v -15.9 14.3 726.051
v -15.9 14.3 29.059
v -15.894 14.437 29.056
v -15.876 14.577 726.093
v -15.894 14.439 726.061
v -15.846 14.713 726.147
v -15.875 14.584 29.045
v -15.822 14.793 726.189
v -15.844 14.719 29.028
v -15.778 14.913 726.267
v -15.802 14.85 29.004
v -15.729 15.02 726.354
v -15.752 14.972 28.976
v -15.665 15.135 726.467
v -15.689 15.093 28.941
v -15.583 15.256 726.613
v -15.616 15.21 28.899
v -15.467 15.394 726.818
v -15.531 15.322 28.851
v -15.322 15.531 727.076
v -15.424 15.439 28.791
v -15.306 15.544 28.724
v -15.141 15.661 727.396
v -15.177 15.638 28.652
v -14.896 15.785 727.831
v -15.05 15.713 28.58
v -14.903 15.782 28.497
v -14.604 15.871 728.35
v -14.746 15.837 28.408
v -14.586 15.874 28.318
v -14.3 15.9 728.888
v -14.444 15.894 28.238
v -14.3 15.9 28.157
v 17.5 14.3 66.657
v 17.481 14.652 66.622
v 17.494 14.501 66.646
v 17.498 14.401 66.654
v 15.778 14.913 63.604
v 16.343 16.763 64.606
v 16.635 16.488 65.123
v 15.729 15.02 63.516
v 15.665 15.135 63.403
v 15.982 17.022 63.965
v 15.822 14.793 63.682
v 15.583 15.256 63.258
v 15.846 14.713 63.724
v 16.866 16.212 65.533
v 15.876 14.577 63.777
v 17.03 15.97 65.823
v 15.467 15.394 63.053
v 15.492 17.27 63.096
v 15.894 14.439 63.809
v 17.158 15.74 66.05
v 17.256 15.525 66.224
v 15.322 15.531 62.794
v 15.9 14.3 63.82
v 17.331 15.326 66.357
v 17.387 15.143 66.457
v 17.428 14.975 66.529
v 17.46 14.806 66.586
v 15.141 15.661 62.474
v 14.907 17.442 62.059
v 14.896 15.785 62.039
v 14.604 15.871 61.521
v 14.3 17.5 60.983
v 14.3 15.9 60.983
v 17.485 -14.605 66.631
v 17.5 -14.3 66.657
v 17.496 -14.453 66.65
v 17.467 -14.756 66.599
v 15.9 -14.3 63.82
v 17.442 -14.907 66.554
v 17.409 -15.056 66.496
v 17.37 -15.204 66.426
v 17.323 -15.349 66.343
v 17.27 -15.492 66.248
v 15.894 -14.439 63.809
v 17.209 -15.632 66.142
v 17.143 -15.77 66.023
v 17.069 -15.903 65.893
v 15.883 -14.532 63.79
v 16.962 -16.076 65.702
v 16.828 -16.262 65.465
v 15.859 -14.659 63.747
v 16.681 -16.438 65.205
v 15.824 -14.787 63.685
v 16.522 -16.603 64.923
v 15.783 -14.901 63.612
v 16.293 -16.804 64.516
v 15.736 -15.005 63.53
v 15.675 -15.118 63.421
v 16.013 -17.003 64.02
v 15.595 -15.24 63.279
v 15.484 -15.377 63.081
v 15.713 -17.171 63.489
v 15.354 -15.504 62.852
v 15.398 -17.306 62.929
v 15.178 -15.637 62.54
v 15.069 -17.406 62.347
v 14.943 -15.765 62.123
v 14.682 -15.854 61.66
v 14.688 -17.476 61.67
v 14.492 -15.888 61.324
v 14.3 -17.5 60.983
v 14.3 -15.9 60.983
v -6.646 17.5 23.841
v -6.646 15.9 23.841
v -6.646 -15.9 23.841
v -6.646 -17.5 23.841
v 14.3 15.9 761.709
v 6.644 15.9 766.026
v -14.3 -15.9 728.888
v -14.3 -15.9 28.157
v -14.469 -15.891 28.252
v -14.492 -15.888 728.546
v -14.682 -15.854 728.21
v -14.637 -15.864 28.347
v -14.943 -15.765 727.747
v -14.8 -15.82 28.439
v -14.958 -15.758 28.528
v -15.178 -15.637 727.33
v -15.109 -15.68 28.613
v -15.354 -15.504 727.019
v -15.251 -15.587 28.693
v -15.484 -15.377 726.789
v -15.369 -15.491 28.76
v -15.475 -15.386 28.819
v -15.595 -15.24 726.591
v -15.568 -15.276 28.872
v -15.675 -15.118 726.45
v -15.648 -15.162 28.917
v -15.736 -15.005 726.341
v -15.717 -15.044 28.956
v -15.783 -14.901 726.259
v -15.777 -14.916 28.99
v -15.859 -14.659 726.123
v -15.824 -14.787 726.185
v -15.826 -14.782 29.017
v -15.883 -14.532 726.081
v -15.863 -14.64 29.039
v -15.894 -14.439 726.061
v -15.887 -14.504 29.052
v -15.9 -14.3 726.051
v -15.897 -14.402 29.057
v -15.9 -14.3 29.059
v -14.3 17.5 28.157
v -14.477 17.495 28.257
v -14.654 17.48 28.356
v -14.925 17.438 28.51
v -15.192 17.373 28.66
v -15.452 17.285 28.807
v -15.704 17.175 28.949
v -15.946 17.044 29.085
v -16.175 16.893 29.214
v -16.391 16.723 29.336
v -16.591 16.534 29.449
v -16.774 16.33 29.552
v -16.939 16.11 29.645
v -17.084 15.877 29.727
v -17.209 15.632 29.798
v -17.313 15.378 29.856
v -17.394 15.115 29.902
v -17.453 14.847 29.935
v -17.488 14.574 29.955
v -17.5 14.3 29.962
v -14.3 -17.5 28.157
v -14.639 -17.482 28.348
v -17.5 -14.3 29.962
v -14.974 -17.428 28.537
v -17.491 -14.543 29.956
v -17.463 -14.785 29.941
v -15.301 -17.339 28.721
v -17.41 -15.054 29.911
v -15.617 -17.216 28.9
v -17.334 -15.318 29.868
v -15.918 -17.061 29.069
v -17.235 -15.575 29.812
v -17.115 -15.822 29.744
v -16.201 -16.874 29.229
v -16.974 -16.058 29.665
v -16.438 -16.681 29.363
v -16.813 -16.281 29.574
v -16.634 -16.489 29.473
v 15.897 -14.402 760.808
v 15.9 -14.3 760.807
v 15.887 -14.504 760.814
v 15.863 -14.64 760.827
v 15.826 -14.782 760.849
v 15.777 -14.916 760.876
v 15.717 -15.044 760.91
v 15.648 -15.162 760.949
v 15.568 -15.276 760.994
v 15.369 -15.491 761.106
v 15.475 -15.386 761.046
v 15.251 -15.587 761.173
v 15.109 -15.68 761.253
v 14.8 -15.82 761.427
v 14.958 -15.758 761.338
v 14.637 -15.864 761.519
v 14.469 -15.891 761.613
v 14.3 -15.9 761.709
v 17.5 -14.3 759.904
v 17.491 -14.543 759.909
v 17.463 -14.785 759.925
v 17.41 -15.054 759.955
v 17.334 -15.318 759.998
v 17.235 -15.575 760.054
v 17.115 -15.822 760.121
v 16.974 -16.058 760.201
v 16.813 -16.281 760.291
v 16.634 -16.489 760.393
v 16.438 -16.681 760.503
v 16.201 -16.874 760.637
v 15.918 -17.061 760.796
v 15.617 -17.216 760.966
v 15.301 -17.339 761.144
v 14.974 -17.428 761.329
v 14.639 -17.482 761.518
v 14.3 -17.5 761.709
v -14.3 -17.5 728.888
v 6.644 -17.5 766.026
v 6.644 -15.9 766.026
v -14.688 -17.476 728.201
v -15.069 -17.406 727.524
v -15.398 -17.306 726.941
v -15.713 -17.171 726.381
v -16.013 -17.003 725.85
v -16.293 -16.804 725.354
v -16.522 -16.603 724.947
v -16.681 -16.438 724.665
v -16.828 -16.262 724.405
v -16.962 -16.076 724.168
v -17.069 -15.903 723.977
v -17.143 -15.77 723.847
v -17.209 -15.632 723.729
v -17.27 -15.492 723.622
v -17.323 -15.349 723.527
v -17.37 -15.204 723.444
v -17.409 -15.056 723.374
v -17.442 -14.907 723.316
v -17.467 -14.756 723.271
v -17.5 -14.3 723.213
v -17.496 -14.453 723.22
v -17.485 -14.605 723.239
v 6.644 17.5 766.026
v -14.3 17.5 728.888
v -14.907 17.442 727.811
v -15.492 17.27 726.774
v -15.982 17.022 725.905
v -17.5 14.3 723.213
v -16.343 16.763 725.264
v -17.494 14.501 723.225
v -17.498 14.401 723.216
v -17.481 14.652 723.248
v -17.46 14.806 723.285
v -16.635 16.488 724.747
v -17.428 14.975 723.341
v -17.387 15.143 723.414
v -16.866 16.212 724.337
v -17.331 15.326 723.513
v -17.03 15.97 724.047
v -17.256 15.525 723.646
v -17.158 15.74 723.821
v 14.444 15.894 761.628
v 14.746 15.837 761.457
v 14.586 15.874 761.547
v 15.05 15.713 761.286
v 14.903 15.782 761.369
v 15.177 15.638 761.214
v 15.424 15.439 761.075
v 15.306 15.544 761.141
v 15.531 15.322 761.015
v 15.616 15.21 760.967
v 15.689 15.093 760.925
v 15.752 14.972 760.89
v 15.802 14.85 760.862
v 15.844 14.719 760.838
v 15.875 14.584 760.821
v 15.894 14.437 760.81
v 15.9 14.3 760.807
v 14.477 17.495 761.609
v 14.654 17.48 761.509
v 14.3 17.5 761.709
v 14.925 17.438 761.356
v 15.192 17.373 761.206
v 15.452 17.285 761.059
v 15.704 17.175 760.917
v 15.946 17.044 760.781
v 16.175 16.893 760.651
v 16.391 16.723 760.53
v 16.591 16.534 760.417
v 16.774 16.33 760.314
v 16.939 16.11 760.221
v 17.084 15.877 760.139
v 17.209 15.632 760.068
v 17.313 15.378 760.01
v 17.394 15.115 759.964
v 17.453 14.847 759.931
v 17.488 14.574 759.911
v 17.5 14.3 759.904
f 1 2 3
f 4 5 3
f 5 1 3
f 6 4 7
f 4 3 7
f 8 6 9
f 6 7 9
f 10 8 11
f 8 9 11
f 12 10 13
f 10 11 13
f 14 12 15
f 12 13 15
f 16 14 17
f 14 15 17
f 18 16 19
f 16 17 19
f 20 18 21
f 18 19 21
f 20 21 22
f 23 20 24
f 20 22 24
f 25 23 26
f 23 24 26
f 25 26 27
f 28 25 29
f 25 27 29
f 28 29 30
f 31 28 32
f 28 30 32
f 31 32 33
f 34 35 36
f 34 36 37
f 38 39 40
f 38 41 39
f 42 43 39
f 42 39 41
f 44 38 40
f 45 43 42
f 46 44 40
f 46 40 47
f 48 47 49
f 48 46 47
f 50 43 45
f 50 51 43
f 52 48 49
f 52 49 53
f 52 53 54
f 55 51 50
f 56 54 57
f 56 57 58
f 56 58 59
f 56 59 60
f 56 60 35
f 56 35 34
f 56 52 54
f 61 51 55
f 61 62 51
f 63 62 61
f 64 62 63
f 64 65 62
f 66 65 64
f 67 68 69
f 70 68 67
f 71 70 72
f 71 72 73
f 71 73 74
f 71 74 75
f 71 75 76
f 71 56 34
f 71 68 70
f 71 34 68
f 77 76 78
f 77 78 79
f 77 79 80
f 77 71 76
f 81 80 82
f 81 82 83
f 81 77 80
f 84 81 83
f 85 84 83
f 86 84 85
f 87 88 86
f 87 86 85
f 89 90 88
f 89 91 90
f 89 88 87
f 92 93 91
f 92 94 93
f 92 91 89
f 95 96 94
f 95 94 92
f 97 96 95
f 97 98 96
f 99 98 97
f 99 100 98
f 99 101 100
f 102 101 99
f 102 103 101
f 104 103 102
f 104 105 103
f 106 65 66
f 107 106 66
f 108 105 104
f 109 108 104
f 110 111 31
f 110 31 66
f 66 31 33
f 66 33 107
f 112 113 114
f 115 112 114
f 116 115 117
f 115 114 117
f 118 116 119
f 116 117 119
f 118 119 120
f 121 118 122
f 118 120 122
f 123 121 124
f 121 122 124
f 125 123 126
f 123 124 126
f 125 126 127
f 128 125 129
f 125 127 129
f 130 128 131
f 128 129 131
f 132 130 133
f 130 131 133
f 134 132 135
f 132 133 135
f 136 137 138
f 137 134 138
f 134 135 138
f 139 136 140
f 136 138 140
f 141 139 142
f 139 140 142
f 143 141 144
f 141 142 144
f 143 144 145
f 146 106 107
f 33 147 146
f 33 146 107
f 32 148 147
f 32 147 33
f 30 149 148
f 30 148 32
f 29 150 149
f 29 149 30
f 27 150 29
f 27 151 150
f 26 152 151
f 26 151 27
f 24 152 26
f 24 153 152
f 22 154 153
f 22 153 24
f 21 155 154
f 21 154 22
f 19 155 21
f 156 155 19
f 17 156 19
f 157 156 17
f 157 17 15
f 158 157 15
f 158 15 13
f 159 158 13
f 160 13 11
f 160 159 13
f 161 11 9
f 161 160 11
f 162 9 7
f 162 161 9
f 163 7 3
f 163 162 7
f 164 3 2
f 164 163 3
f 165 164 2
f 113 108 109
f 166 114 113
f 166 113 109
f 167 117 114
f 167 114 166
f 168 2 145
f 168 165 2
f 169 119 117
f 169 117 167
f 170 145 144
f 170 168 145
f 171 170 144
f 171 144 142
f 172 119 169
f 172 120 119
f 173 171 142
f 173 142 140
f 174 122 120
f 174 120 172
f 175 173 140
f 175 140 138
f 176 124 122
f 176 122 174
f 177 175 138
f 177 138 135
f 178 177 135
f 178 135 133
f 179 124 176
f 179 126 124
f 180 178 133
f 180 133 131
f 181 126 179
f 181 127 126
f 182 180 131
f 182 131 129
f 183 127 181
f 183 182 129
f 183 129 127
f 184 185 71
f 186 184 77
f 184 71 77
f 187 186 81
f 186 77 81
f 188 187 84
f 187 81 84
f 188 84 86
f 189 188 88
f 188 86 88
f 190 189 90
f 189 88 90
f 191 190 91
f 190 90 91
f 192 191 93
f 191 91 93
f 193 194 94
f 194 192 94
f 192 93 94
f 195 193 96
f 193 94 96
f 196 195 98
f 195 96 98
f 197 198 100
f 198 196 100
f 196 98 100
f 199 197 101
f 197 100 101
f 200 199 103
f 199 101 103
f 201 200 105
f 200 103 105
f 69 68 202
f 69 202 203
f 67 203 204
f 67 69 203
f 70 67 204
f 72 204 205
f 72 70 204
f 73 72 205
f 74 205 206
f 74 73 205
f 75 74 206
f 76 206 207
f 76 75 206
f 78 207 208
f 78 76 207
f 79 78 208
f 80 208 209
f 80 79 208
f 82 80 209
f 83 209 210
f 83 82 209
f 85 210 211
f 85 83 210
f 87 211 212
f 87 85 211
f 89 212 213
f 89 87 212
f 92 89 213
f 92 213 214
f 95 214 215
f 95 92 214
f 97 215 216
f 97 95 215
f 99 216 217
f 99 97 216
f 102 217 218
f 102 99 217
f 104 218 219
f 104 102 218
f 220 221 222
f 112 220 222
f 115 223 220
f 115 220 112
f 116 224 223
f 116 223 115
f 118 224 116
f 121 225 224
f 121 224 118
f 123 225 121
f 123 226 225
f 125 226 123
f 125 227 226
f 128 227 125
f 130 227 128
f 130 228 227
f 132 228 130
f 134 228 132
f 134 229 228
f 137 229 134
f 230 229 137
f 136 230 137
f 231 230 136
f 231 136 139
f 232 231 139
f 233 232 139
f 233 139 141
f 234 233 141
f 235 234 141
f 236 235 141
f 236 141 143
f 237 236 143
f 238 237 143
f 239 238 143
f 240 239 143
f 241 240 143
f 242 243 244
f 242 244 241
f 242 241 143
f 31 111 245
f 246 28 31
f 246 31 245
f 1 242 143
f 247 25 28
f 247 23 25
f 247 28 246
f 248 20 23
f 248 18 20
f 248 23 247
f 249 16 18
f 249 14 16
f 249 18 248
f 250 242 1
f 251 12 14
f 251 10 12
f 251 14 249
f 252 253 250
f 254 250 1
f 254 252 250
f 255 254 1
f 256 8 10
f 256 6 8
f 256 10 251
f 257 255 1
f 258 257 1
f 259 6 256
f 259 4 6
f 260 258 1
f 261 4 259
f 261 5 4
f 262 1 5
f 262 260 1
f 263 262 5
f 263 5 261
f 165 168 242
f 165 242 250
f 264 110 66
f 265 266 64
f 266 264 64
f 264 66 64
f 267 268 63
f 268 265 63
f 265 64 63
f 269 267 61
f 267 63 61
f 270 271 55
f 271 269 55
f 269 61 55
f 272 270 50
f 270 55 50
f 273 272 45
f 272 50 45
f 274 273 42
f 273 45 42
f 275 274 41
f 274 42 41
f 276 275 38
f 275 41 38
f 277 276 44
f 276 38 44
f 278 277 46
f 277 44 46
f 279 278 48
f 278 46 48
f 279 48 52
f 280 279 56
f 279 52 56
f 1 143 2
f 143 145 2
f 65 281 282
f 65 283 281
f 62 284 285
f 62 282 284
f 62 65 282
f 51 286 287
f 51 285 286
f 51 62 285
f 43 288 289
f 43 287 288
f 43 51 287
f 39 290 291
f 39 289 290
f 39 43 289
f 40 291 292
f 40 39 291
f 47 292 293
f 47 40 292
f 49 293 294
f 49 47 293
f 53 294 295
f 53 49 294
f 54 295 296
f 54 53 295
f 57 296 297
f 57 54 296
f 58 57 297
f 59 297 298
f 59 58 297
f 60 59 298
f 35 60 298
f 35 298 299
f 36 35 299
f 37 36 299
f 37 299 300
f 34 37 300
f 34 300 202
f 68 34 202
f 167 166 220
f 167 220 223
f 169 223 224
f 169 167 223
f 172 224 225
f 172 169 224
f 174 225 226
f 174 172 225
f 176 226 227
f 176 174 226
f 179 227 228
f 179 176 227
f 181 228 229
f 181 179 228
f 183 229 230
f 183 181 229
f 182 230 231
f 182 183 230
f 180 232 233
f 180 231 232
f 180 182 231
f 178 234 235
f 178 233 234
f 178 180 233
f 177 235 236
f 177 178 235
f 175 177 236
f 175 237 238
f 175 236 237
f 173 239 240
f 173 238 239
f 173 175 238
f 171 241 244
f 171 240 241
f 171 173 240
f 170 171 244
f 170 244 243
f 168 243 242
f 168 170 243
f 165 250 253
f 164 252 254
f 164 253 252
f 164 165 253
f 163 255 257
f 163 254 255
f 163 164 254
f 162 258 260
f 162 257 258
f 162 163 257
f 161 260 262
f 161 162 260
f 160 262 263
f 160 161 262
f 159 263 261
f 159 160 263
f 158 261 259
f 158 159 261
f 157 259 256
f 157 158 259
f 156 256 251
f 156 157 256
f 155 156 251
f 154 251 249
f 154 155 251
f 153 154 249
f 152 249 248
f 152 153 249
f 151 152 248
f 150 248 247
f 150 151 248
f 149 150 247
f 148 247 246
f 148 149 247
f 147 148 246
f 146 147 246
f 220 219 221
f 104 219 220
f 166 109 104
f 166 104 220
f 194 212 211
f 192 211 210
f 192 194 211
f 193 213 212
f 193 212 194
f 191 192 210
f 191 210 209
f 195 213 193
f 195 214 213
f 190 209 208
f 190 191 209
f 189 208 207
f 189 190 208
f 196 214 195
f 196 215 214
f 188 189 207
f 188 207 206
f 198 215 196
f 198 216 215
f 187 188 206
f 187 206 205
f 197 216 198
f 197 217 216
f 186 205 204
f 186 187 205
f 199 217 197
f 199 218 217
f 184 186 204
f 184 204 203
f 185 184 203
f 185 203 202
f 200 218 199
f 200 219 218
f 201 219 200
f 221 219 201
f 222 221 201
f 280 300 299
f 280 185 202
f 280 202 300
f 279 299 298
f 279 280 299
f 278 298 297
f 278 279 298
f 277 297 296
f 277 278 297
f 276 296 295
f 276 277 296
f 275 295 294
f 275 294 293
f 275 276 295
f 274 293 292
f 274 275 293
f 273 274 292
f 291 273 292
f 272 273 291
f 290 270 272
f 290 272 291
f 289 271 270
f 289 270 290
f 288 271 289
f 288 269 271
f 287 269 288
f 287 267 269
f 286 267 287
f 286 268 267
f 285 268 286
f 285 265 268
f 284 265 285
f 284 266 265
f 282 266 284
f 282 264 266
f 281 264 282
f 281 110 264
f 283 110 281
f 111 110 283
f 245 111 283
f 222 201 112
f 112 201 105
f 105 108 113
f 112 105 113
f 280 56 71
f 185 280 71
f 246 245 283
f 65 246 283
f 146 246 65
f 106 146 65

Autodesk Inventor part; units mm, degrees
ref_plane "Start plane" through (0, 0, 10.2219) normal (0, 0, 1) x (1, 0, 0)
ref_plane "End plane" through (0, 0, 785.2713) normal (0, 0, 1) x (1, 0, 0)
sketch "Sketch" plane through (0, 0, 0) normal (0, 0, 1) x (1, 0, 0)
  line L0 (-17.5, -14.3) -> (-17.5, 14.3)
  line L1 (-14.3, 17.5) -> (14.3, 17.5)
  line L2 (17.5, 14.3) -> (17.5, -14.3)
  line L3 (14.3, -17.5) -> (-14.3, -17.5)
  arc A0 (-17.5, -14.3) -> (-14.3, -17.5) centre (-14.3, -14.3) ccw
  arc A1 (-14.3, 17.5) -> (-17.5, 14.3) centre (-14.3, 14.3) ccw
  arc A2 (17.5, 14.3) -> (14.3, 17.5) centre (14.3, 14.3) ccw
  arc A3 (14.3, -17.5) -> (17.5, -14.3) centre (14.3, -14.3) ccw
  arc A4 (-14.3, 15.9) -> (-15.9, 14.3) centre (-14.3, 14.3) ccw
  line L4 (-14.3, 15.9) -> (14.3, 15.9)
  arc A5 (15.9, 14.3) -> (14.3, 15.9) centre (14.3, 14.3) ccw
  line L5 (15.9, 14.3) -> (15.9, -14.3)
  arc A6 (14.3, -15.9) -> (15.9, -14.3) centre (14.3, -14.3) ccw
  line L6 (14.3, -15.9) -> (-14.3, -15.9)
  arc A7 (-15.9, -14.3) -> (-14.3, -15.9) centre (-14.3, -14.3) ccw
  line L7 (-15.9, -14.3) -> (-15.9, 14.3)
  line L8 (0, 25.4278) -> (0, -25.4278) construction
  line L9 (-25.4278, 0) -> (25.4278, 0) construction
  dimension "d7" = 3.2
  dimension "d10" = 35
  dimension "d11" = 35
  dimension "d12" = 1.6
  dimension "d15" = 17.5
  dimension "d16" = 17.5
extrude "Body" add sketch "Sketch" along normal up to surface (775.0495 mm away) from surface at 10.2219
sketch "Sketch3" plane through (0, 0, 0) normal (0, 0, 1) x (1, 0, 0)
  line L0 (0, 0) -> (10, 0)
ref_plane "Work Plane3" through (0, 0, 0) normal (0, -1, 0) x (1, 0, 0)
sketch "Sketch4" plane through (0, 0, 0) normal (0, -1, 0) x (1, 0, 0)
  line L0 (-2, 10.2219) -> (12, 10.2219)
  line L1 (-2, 785.2713) -> (12, 785.2713)
  dimension "d18" = 775.0495
ref_plane "Work Plane4" through (344.6079, 0, 575.4319) normal (0.4912, 0, 0.871) x (0.871, 0, -0.4912)
split "Split1" plane through (344.6079, 0, 575.4319) removes the side toward (0.4912, 0, 0.871)
ref_plane "Work Plane5" through (-331.3145, 0, 166.7549) normal (-0.871, 0, 0.4912) x (0.4912, 0, 0.871)
split "Split2" plane through (-331.3145, 0, 166.7549) removes the side toward (-0.871, 0, 0.4912)
ref_plane "Work Plane6" through (-23.8395, 0, -6.6467) normal (0.871, 0, -0.4912) x (-0.4912, 0, -0.871)
split "Split3" plane through (-23.8395, 0, -6.6467) removes the side toward (0.871, 0, -0.4912)
ref_plane "Work Plane7" through (-344.6079, 0, 214.4339) normal (-0.4912, 0, -0.871) x (-0.871, 0, 0.4912)
split "Split4" plane through (-344.6079, 0, 214.4339) removes the side toward (-0.4912, 0, -0.871)
equation "\"d7\" = G_IR"
equation "\"d10\" = G_H"
equation "\"d11\" = G_W"
equation "\"d12\" = G_T"
equation "\"d15\" = 0.5 * d10"
equation "\"d16\" = 0.5 * d11"
equation "\"d3\" = G_L"
equation "\"G_W\" = 35"
equation "\"G_H\" = 35"
equation "\"G_T\" = 1.6"
equation "\"G_IR\" = 3.2"
equation "\"G_L\" = d18"
equation "\"G_OFFSET_START\" = -10.22188"
equation "\"G_OFFSET_END\" = -4.59446"
equation "\"d13\" = -G_OFFSET_START"
equation "\"d14\" = G_OFFSET_END + B_L"
equation "\"B_L\" = 789.86581"
properties part number "AS 1163 - C350L0 35x35x1.6 SHS - 775.049" material "Steel, Mild"
